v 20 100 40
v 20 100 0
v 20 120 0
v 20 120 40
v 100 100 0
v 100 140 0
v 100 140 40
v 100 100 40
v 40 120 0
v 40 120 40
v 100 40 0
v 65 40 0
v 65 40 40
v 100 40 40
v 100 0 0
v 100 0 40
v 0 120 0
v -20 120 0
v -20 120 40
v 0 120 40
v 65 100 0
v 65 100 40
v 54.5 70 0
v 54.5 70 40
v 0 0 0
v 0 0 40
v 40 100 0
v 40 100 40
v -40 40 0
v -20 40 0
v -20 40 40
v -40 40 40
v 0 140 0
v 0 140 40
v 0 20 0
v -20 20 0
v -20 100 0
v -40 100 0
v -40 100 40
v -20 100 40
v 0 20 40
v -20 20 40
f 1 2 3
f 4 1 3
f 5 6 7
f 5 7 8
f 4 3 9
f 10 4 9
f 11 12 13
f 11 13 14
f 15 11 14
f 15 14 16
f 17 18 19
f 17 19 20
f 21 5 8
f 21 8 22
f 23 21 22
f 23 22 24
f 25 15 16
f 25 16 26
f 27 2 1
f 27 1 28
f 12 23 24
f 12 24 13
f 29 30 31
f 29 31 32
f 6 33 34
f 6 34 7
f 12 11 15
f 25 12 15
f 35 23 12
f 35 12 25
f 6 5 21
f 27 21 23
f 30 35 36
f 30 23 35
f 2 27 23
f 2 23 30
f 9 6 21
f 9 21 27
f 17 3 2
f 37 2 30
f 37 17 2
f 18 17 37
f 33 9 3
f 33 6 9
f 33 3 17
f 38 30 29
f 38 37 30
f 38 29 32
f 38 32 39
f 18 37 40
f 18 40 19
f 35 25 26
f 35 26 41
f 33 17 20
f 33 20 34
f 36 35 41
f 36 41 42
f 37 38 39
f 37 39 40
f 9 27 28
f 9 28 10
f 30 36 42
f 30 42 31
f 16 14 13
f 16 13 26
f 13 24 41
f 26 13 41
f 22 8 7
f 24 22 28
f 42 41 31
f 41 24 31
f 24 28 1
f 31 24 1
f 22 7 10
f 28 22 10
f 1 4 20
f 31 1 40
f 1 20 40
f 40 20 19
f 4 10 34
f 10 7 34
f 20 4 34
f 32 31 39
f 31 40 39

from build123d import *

# Parameters (mm, degrees)
SKETCH1_W      = 20
SKETCH1_H      = 20
EXTRUDE1_DEPTH = 40


with BuildPart() as part:
    # Sketch1 → Extrude1 (new body)
    with BuildSketch(Plane.XY):
        Polygon((0, 140), (100, 140), (100, 100), (65, 100), (54.5, 70), (65, 40), (100, 40), (100, 0), (0, 0), (0, 20), (-20, 20), (-20, 40), (-40, 40), (-40, 100), (-20, 100), (-20, 120), (0, 120), align=None)
        with Locations((30, 110)):
            Rectangle(SKETCH1_W, SKETCH1_H, mode=Mode.SUBTRACT)
    extrude(amount=EXTRUDE1_DEPTH)


solid = part.part
